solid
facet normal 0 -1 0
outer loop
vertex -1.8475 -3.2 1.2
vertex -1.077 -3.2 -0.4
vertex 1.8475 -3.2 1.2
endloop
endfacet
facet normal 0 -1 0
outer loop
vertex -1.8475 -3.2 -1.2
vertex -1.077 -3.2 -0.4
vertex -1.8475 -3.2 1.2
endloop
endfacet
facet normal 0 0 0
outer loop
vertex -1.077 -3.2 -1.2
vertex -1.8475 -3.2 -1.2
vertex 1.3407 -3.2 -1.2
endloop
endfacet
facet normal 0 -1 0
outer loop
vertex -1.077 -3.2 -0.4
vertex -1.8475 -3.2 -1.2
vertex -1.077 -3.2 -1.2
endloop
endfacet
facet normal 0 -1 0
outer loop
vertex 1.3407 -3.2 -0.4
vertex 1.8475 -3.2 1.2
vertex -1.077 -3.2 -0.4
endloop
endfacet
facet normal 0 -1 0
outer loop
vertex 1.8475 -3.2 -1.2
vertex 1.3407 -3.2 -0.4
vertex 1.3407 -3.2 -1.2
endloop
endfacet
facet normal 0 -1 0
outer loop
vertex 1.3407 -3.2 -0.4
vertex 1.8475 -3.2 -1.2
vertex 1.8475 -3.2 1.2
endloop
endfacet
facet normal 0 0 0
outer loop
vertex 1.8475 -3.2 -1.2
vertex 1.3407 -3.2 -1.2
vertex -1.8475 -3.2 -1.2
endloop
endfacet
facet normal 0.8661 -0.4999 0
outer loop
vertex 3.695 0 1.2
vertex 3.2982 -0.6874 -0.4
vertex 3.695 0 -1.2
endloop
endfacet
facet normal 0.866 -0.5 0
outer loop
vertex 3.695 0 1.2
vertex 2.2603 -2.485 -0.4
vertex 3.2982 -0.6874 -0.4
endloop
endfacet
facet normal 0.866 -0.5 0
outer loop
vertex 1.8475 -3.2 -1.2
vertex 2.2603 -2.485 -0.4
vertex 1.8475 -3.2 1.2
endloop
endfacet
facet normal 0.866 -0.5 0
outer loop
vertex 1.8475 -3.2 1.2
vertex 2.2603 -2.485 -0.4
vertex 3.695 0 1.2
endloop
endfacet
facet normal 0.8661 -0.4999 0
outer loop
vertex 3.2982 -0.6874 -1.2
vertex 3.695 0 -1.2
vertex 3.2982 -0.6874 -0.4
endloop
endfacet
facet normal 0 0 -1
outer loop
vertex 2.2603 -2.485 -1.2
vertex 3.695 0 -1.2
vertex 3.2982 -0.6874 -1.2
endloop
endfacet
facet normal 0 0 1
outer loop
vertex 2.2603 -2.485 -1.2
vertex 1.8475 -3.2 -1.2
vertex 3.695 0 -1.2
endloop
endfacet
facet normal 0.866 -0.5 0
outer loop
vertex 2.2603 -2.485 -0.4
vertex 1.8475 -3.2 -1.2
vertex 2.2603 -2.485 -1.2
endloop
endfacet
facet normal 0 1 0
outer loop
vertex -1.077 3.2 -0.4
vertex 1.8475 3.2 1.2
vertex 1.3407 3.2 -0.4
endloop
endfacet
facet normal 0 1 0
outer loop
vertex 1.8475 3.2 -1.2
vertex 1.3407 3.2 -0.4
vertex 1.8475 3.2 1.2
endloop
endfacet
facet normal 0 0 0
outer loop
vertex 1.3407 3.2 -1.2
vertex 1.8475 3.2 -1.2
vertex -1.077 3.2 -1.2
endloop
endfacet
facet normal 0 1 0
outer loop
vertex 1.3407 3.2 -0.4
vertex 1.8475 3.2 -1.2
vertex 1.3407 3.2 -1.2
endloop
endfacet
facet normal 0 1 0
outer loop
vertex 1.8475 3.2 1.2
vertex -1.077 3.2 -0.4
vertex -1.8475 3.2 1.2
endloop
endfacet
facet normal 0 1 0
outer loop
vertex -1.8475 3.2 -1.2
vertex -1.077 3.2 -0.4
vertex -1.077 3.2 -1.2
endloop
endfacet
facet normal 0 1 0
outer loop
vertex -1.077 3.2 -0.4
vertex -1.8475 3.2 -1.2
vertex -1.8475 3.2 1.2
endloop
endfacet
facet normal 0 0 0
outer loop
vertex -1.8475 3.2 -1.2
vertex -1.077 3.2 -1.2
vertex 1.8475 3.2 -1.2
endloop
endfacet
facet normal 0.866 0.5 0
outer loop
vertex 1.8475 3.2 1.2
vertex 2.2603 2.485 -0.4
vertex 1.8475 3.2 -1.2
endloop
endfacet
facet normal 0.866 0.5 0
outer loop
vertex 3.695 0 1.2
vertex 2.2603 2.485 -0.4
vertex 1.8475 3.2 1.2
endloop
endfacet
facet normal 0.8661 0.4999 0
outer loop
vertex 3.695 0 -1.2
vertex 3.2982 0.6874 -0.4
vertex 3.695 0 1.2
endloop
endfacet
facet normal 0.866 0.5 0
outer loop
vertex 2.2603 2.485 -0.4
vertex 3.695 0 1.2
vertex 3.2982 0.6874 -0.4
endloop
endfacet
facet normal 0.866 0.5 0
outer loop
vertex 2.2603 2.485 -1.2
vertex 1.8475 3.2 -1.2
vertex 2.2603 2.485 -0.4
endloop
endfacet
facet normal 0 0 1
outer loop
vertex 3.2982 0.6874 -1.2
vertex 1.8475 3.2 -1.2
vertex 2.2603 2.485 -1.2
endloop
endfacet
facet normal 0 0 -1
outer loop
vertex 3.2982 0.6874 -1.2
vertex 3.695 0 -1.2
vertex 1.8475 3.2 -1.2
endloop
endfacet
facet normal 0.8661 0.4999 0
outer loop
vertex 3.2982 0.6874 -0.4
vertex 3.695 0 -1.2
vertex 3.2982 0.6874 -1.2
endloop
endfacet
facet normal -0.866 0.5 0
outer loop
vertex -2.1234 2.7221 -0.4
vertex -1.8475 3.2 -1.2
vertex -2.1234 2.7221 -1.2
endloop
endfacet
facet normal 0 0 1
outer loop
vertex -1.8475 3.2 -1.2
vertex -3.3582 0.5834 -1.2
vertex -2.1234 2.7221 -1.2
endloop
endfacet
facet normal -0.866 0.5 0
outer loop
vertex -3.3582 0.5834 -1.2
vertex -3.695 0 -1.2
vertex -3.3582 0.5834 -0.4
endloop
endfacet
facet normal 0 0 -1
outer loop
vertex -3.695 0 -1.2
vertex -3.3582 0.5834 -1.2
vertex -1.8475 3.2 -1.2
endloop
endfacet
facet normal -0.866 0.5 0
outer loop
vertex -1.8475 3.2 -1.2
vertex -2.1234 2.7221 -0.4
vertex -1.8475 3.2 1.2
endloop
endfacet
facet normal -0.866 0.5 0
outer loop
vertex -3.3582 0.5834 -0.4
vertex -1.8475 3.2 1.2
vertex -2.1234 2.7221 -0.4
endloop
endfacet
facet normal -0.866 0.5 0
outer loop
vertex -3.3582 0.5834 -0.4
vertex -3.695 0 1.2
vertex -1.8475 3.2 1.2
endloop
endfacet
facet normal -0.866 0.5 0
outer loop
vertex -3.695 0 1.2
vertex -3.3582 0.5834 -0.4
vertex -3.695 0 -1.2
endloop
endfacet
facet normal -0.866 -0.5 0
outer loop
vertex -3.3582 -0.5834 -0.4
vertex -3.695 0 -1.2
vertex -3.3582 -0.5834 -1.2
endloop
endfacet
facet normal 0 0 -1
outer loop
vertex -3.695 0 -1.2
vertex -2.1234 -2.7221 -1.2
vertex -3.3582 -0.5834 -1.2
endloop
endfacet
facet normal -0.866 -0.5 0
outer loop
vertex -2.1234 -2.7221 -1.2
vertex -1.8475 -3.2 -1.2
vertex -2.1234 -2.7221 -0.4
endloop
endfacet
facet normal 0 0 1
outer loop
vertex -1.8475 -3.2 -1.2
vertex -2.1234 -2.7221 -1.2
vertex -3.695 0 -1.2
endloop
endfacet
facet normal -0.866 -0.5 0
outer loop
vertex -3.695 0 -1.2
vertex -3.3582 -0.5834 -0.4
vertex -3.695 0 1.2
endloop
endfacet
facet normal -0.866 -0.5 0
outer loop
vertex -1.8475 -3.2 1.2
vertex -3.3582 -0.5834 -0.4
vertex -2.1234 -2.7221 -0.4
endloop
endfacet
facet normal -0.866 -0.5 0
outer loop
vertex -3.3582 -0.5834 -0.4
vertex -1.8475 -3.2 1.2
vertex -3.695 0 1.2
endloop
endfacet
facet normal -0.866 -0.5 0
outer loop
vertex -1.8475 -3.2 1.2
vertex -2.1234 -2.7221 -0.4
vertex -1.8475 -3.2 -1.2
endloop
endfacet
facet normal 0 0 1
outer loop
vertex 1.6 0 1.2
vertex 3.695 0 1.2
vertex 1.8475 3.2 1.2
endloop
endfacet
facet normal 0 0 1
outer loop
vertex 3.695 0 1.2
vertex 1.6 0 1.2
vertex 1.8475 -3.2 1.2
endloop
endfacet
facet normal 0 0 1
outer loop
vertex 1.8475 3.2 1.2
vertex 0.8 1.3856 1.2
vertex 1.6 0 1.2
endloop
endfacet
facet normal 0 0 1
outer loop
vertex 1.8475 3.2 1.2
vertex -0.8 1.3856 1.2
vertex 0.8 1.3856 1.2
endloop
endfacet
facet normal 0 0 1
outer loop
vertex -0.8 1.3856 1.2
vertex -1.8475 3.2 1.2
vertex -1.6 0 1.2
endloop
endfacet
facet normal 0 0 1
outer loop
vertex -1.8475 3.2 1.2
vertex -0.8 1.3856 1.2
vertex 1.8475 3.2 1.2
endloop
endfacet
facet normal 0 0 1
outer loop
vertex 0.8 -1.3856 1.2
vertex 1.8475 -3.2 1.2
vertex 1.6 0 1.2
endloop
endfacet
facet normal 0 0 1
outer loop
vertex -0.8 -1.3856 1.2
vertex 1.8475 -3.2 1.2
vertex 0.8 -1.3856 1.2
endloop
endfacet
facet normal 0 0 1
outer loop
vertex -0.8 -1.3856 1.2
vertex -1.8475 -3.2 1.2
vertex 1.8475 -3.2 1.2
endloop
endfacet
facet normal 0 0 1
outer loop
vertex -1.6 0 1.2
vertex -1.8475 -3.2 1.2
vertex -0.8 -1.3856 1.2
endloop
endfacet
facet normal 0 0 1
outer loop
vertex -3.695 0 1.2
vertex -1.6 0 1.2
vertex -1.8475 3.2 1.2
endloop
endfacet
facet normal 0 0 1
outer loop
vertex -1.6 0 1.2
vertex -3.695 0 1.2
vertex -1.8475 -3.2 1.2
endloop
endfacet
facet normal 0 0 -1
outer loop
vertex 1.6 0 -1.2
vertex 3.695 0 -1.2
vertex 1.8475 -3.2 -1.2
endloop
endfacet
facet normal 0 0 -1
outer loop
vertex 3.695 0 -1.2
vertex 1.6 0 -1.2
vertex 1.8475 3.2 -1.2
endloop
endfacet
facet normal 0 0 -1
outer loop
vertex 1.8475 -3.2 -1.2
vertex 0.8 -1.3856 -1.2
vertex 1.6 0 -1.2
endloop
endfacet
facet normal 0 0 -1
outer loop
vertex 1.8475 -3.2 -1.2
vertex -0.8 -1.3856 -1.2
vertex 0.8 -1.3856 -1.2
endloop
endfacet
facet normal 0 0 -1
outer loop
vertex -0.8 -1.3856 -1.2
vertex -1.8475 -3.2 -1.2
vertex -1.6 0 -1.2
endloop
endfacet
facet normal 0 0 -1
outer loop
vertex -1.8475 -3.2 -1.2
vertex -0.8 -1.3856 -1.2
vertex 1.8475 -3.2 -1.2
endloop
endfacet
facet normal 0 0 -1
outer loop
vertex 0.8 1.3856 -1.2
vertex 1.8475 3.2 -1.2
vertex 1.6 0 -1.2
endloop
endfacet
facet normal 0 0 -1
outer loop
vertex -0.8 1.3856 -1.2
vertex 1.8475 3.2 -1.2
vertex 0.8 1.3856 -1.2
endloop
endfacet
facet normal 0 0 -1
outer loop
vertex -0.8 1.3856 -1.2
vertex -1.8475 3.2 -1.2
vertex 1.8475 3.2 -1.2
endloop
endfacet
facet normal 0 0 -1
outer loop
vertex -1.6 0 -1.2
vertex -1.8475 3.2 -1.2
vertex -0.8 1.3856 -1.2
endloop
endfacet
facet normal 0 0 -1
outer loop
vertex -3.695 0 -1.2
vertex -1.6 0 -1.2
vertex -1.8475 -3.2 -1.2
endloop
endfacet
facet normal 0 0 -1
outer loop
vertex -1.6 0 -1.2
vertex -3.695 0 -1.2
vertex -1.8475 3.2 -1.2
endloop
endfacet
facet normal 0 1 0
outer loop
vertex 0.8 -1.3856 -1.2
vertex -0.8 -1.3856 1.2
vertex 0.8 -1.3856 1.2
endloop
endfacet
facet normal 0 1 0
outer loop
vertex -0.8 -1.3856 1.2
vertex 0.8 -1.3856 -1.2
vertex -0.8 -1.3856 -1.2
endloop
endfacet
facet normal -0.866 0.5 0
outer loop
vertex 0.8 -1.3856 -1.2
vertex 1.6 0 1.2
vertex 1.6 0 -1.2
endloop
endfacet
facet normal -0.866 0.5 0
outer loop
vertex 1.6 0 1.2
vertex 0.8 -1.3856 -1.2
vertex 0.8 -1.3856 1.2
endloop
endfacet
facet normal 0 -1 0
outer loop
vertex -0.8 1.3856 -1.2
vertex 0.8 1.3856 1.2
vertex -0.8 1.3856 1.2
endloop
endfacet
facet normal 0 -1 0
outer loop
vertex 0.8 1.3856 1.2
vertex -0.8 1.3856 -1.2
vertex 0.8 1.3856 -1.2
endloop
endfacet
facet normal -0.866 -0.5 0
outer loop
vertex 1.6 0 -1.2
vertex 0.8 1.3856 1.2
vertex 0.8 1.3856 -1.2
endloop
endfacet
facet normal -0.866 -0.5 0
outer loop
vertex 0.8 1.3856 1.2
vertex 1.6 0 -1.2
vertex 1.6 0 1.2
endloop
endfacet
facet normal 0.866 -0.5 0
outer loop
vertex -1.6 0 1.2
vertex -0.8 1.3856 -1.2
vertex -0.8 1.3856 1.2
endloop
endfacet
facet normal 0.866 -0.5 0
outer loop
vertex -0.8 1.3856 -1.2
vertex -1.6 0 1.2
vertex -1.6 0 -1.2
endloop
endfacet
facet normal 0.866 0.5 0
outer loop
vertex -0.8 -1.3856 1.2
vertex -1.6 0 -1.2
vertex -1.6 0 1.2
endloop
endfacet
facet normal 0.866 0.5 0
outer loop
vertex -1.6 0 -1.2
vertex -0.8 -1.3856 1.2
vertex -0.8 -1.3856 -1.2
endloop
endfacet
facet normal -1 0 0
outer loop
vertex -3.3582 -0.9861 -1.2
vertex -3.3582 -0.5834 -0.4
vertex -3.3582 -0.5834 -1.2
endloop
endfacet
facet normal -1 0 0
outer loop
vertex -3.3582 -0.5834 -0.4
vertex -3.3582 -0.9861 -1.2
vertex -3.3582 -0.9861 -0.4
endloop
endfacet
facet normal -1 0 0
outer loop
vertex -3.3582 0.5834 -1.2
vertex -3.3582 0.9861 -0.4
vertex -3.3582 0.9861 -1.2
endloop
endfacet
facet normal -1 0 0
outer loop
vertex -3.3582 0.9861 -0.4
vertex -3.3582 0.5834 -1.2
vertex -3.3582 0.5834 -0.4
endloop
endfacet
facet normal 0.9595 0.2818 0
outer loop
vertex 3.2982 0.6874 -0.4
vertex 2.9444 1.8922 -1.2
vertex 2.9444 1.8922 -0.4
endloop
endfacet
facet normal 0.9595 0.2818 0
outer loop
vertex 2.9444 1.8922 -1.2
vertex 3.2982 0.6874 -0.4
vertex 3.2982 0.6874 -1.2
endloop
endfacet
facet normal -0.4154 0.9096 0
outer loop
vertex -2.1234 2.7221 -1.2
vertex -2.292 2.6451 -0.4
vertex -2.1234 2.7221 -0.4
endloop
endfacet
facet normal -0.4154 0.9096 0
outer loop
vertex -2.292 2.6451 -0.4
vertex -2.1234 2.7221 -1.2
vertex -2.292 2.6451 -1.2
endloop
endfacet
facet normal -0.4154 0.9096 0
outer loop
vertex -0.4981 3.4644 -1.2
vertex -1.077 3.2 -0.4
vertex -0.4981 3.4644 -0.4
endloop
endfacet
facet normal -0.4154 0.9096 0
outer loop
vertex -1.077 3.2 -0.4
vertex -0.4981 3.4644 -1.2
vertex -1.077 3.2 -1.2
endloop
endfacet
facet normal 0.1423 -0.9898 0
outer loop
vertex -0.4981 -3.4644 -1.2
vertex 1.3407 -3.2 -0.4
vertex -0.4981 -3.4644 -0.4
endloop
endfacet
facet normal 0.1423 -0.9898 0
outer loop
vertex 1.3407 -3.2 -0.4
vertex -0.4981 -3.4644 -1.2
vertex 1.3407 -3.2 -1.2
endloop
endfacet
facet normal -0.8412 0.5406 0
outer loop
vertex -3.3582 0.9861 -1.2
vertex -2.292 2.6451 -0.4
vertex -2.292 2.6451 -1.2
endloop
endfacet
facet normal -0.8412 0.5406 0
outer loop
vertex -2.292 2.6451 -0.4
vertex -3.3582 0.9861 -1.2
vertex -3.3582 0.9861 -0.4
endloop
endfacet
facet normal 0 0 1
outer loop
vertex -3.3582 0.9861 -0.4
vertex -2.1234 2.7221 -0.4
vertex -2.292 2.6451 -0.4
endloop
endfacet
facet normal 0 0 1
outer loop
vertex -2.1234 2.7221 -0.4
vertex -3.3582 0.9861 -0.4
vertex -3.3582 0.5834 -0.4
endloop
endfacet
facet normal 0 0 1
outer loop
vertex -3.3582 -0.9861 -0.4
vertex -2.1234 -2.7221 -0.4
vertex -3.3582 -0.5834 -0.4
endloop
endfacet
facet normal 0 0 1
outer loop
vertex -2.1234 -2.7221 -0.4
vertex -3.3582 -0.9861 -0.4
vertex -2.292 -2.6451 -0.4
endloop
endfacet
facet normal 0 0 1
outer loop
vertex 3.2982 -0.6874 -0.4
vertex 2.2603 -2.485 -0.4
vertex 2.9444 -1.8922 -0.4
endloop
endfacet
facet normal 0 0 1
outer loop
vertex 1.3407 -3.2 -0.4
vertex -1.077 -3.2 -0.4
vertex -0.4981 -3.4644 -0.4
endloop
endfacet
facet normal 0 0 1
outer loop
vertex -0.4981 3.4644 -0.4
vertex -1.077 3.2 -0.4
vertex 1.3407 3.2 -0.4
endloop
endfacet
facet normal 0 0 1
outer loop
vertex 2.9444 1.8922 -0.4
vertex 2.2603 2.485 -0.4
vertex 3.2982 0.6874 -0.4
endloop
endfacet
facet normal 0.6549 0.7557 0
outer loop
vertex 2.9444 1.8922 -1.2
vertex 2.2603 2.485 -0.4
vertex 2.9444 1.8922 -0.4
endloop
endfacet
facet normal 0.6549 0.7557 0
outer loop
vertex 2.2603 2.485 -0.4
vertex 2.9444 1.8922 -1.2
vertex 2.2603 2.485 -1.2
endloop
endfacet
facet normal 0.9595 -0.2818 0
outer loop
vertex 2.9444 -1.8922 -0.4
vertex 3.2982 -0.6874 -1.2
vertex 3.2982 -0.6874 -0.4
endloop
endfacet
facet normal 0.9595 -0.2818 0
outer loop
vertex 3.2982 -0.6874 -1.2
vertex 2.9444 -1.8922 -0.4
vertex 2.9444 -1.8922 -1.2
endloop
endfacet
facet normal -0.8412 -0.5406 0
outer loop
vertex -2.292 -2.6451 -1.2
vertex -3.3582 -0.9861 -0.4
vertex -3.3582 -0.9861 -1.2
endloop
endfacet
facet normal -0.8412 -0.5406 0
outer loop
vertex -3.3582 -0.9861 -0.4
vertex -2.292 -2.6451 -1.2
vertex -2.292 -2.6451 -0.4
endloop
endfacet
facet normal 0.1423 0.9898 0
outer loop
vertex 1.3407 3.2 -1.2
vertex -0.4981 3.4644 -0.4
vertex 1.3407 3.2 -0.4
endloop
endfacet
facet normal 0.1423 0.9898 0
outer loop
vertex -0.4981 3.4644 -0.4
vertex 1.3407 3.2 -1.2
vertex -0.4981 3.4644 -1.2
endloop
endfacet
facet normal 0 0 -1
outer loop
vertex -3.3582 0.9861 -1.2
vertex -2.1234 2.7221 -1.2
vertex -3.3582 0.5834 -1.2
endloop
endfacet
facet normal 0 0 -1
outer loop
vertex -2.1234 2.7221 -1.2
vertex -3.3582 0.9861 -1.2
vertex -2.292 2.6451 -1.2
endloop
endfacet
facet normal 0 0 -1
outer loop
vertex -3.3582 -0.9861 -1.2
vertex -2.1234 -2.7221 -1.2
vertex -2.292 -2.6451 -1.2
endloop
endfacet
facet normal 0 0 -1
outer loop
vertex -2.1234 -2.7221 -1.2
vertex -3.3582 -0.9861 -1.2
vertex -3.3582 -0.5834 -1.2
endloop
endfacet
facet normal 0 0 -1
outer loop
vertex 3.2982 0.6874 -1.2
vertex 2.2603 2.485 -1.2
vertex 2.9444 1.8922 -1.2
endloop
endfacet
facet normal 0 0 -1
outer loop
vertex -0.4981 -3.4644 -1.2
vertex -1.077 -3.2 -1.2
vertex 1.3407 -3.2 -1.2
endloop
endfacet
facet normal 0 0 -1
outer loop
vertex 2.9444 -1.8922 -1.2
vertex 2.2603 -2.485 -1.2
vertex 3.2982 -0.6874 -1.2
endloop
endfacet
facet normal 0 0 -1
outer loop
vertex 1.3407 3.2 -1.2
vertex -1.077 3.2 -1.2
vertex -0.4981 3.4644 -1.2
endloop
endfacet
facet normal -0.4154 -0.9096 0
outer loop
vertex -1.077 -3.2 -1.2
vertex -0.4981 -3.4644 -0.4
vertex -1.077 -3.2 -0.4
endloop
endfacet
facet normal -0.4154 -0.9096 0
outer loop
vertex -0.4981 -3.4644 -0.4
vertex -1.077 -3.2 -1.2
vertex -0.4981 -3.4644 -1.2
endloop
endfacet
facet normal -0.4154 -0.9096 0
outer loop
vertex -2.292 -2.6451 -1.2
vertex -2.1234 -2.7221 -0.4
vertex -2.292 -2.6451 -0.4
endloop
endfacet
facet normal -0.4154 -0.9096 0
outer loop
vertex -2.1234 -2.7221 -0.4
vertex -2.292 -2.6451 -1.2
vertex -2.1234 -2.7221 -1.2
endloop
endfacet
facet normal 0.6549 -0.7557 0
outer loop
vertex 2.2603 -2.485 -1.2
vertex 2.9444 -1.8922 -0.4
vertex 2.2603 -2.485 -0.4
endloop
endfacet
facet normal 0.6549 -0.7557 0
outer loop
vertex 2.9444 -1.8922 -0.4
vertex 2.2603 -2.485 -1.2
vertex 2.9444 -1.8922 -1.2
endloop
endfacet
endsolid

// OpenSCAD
// Parameters
thread_nominal_diameter_mm = 3.0; //[1.5:6.0:0.1]
across_flats_mm = 6.4; //[3.2:12.8:0.1]
thickness_mm = 2.4; //[1.2:4.8:0.1]
thread_pitch_mm = 0.5; //[0.25:1.0:0.05]
chamfer_mm = 0.2; //[0.0:0.6:0.05]
hole_clearance_mm = 0.2; //[0.0:0.6:0.05]
hole_extra_height_mm = 0.6; //[0.2:2.0:0.1]
overlap_mm = 0.8; //[0.5:2.0:0.1]
washer_outer_diameter_mm = 7.0; //[5.0:14.0:0.1]
washer_thickness_mm = 0.8; //[0.4:2.0:0.1]

// M3 Nut - complete geometry
module nut() {
  color("DimGray") {
    difference() {
      // Hex nut body
      cylinder(r=across_flats_mm/(2*cos(30)), h=thickness_mm, center=true, $fn=6);
      // Central thread hole
      translate([0, 0, 0])
        cylinder(r=(thread_nominal_diameter_mm + hole_clearance_mm)/2, h=thickness_mm + hole_extra_height_mm, center=true);
      // Top chamfer
      translate([0, 0, thickness_mm/2 - chamfer_mm/2 + overlap_mm/2])
        cylinder(r1=across_flats_mm/(2*cos(30)) + overlap_mm, r2=0, h=chamfer_mm, center=true);
      // Bottom chamfer
      translate([0, 0, -(thickness_mm/2 - chamfer_mm/2 + overlap_mm/2)])
        cylinder(r1=across_flats_mm/(2*cos(30)) + overlap_mm, r2=0, h=chamfer_mm, center=true);
    }
  }
}

// Washer - complete geometry
module washer() {
  color("Silver") {
    difference() {
      // Washer outer
      cylinder(r=washer_outer_diameter_mm/2, h=washer_thickness_mm, center=true);
      // Washer hole
      translate([0, 0, 0])
        cylinder(r=(thread_nominal_diameter_mm + hole_clearance_mm)/2, h=washer_thickness_mm + hole_extra_height_mm, center=true);
    }
  }
}

// Nut and Washer Assembly
module nut_and_washer() {
  union() {
    nut();
    translate([0, 0, -(thickness_mm/2 + washer_thickness_mm/2 - overlap_mm)])
      washer();
  }
}

// Final Assembly
module assembly() {
  nut_and_washer();
}

assembly();
